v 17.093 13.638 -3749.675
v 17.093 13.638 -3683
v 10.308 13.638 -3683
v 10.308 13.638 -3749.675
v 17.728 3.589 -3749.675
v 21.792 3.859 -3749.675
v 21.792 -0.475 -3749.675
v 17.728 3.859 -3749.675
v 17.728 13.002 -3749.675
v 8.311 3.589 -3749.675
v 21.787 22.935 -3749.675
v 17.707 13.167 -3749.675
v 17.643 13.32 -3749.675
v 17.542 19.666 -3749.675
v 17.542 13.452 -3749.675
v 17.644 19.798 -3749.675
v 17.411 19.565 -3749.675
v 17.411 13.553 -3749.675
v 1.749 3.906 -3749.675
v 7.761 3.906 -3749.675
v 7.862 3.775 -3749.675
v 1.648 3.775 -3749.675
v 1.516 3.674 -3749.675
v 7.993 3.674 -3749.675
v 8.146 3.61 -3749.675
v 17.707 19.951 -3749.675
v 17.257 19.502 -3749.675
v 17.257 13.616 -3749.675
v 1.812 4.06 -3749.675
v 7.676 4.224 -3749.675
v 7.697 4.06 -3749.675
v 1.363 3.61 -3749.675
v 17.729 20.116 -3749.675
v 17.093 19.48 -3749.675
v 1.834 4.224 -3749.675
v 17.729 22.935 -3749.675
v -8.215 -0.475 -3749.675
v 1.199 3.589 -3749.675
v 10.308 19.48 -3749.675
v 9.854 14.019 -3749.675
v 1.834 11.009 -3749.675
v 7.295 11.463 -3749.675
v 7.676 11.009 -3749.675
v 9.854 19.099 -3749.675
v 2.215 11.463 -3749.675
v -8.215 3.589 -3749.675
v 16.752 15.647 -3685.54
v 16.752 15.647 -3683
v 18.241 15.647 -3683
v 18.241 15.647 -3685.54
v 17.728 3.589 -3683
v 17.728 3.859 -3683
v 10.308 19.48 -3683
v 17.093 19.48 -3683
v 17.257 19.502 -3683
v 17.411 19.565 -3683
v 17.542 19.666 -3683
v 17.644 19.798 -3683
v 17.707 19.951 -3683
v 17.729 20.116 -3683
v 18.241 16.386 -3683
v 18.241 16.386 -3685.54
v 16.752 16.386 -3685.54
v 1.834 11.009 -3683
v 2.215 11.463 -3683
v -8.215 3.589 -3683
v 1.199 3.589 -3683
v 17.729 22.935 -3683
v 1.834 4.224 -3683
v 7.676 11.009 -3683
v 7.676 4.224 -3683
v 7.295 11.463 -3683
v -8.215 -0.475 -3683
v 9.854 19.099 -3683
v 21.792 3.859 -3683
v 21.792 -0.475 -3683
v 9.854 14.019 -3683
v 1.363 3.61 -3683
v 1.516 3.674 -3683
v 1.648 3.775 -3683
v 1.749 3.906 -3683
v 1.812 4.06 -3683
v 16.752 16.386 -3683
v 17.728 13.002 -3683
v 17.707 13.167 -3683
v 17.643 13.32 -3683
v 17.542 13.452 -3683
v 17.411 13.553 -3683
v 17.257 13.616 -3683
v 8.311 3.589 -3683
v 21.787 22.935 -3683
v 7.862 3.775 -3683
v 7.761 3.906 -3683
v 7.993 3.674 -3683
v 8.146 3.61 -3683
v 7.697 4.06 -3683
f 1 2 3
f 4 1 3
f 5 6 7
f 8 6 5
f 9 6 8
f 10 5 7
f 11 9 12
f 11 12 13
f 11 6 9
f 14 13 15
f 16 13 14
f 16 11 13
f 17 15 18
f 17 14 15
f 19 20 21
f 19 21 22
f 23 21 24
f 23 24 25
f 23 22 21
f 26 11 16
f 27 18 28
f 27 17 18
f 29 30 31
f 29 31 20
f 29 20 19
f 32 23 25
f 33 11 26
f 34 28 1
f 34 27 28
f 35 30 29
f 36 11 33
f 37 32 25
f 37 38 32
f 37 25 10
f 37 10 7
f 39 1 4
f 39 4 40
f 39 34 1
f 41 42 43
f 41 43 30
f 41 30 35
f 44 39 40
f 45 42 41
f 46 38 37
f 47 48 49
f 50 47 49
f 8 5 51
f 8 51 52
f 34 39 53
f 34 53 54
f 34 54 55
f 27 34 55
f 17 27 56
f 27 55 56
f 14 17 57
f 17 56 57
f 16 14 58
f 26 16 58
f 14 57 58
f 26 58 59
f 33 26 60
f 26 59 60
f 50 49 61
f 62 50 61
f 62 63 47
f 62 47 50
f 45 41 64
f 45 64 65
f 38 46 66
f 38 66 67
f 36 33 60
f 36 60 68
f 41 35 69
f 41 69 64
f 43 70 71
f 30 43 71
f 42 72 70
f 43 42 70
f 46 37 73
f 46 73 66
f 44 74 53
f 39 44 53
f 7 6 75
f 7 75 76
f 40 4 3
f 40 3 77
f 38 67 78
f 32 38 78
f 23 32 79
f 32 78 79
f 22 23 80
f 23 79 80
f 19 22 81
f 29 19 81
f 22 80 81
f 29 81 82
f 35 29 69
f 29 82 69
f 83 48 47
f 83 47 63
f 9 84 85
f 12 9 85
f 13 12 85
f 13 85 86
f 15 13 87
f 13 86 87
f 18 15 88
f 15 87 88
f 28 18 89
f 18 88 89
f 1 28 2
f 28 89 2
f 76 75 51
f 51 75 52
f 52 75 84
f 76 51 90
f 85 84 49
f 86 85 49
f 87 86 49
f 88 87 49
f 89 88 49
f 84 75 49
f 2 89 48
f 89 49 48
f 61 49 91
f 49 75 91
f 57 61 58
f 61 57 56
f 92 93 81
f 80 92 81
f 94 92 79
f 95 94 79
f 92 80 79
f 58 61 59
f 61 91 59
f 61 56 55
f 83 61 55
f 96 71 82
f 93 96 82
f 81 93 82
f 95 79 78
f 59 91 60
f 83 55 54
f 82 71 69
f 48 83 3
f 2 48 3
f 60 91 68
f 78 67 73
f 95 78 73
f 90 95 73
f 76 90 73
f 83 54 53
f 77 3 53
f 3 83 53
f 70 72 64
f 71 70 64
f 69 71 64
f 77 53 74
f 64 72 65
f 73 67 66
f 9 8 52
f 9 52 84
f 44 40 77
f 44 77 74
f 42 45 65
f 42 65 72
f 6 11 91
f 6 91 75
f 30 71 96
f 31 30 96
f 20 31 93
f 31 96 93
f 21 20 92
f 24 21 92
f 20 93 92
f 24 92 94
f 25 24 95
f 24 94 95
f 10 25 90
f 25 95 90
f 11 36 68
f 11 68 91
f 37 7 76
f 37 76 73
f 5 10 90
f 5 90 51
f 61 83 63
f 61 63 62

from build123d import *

# Parameters (mm, degrees)
BOSS_EXTRUDE1_DEPTH = 66.675
CUT_EXTRUDE1_REACH  = 75.8
CUT_EXTRUDE2_REACH  = 75.8
SKETCH5_W           = 1.489310624
SKETCH5_H           = 0.739469686
CUT_EXTRUDE3_DEPTH  = 2.54


with BuildPart() as part:
    # Sketch1 → Boss-Extrude1 (new body)
    with BuildSketch(Plane(origin=(0, 0, -3683), x_dir=(-1, 0, 0), z_dir=(0, 0, -1))):
        with BuildLine():
            Line((7.945265893, 3.588862728), (-1.198734107, 3.588862728))
            ThreePointArc((-1.198734107, 3.588862728), (-1.647746913, 3.774849922), (-1.833734107, 4.223862728))
            Line((-1.833734107, 4.223862728), (-1.833734107, 5.747862728))
            ThreePointArc((-1.833734107, 5.747862728), (-1.647746913, 6.196875535), (-1.198734107, 6.382862728))
            Line((-1.198734107, 6.382862728), (1.621629442, 6.382862728))
            Line((1.621629442, 6.382862728), (1.621629442, 6.890862686))
            Line((1.621629442, 6.890862686), (-2.214734107, 11.462862728))
            Line((-2.214734107, 11.462862728), (-7.294734107, 11.462862728))
            Line((-7.294734107, 11.462862728), (-11.131097656, 6.890862686))
            Line((-11.131097656, 6.890862686), (-11.131097656, 6.382862728))
            Line((-11.131097656, 6.382862728), (-8.310734107, 6.382862728))
            ThreePointArc((-8.310734107, 6.382862728), (-7.861721301, 6.196875535), (-7.675734107, 5.747862728))
            Line((-7.675734107, 5.747862728), (-7.675734107, 4.223862728))
            ThreePointArc((-7.675734107, 4.223862728), (-7.861721301, 3.774849922), (-8.310734107, 3.588862728))
            Line((-8.310734107, 3.588862728), (-17.454734107, 3.588862728))
            Line((-17.454734107, 3.588862728), (-17.727921752, 3.588862728))
            Line((-17.727921752, 3.588862728), (-17.727921752, 3.858842754))
            Line((-17.727921752, 3.858842754), (-17.728361466, 13.002372481))
            ThreePointArc((-17.728361466, 13.002372481), (-17.542256287, 13.451715967), (-17.092921752, 13.637842754))
            Line((-17.092921752, 13.637842754), (-15.568921752, 13.637842754))
            ThreePointArc((-15.568921752, 13.637842754), (-15.119908946, 13.45185556), (-14.933921752, 13.002842754))
            Line((-14.933921752, 13.002842754), (-14.933921752, 10.182479205))
            Line((-14.933921752, 10.182479205), (-14.425921794, 10.182479205))
            Line((-14.425921794, 10.182479205), (-9.853921752, 14.018842754))
            Line((-9.853921752, 14.018842754), (-9.853921752, 19.098842754))
            Line((-9.853921752, 19.098842754), (-14.425921794, 22.935206303))
            Line((-14.425921794, 22.935206303), (-14.933921752, 22.935206303))
            Line((-14.933921752, 22.935206303), (-14.933921752, 20.114842754))
            ThreePointArc((-14.933921752, 20.114842754), (-15.119908946, 19.665829948), (-15.568921752, 19.479842754))
            Line((-15.568921752, 19.479842754), (-17.092921752, 19.479842754))
            ThreePointArc((-17.092921752, 19.479842754), (-17.542476558, 19.66604812), (-17.728703542, 20.11559397))
            Line((-17.728703542, 20.11559397), (-17.728839138, 22.935206303))
            Line((-17.728839138, 22.935206303), (-21.787214199, 22.935206303))
            Line((-21.787214199, 22.935206303), (-21.791921752, 3.859128788))
            Line((-21.791921752, 3.859128788), (-21.791921752, 3.588862728))
            Line((-21.791921752, 3.588862728), (-21.791921752, -0.475137272))
            Line((-21.791921752, -0.475137272), (-17.727921752, -0.475137272))
            Line((-17.727921752, -0.475137272), (-17.454774021, -0.475137272))
            Line((-17.454774021, -0.475137272), (7.945225979, -0.475137272))
            Line((7.945225979, -0.475137272), (8.215492039, -0.475137272))
            Line((8.215492039, -0.475137272), (8.215492039, 3.588862728))
            Line((8.215492039, 3.588862728), (7.945265893, 3.588862728))
        make_face()
    extrude(amount=BOSS_EXTRUDE1_DEPTH)

    # Sketch2 → Cut-Extrude1 (cut, up to next)
    with BuildSketch(Plane.XY.offset(-3683), mode=Mode.PRIVATE) as cut_extrude1_sk1:
        with BuildLine():
            Line((11.131097656, 6.890862686), (11.131097656, 6.382862728))
            Line((11.131097656, 6.382862728), (8.310734107, 6.382862728))
            ThreePointArc((8.310734107, 6.382862728), (7.861721301, 6.196875535), (7.675734107, 5.747862728))
            Line((7.675734107, 5.747862728), (7.675734107, 11.00880461))
            Line((7.675734107, 11.00880461), (11.131097656, 6.890862686))
        make_face()
    cut_extrude1_tool1 = extrude(cut_extrude1_sk1.sketch, amount=-CUT_EXTRUDE1_REACH, mode=Mode.PRIVATE) & part.part
    # Sketch2 → Cut-Extrude1 (cut, up to next)
    with BuildSketch(Plane.XY.offset(-3683), mode=Mode.PRIVATE) as cut_extrude1_sk2:
        with BuildLine():
            Line((1.833734107, 5.747862728), (1.833734107, 11.00880461))
            Line((1.833734107, 11.00880461), (-1.621629442, 6.890862686))
            Line((-1.621629442, 6.890862686), (-1.621629442, 6.382862728))
            Line((-1.621629442, 6.382862728), (1.198734107, 6.382862728))
            ThreePointArc((1.198734107, 6.382862728), (1.647746913, 6.196875535), (1.833734107, 5.747862728))
        make_face()
    cut_extrude1_tool2 = extrude(cut_extrude1_sk2.sketch, amount=-CUT_EXTRUDE1_REACH, mode=Mode.PRIVATE) & part.part
    add(cut_extrude1_tool1.solids().sort_by_distance((8.930632, 7.925168, -3683))[0], mode=Mode.SUBTRACT)
    add(cut_extrude1_tool2.solids().sort_by_distance((0.578837, 7.925168, -3683))[0], mode=Mode.SUBTRACT)

    # Sketch3 → Cut-Extrude2 (cut, up to next)
    with BuildSketch(Plane.XY.offset(-3683), mode=Mode.PRIVATE) as cut_extrude2_sk1:
        with BuildLine():
            Line((15.568921752, 19.479842754), (10.307979871, 19.479842754))
            Line((10.307979871, 19.479842754), (14.425921794, 22.935206303))
            Line((14.425921794, 22.935206303), (14.933921752, 22.935206303))
            Line((14.933921752, 22.935206303), (14.933921752, 20.114842754))
            ThreePointArc((14.933921752, 20.114842754), (15.119908946, 19.665829948), (15.568921752, 19.479842754))
        make_face()
    cut_extrude2_tool1 = extrude(cut_extrude2_sk1.sketch, amount=-CUT_EXTRUDE2_REACH, mode=Mode.PRIVATE) & part.part
    # Sketch3 → Cut-Extrude2 (cut, up to next)
    with BuildSketch(Plane.XY.offset(-3683), mode=Mode.PRIVATE) as cut_extrude2_sk2:
        with BuildLine():
            Line((10.307979871, 13.637842754), (14.425921794, 10.182479205))
            Line((14.425921794, 10.182479205), (14.933921752, 10.182479205))
            Line((14.933921752, 10.182479205), (14.933921752, 13.002842754))
            ThreePointArc((14.933921752, 13.002842754), (15.119908946, 13.45185556), (15.568921752, 13.637842754))
            Line((15.568921752, 13.637842754), (10.307979871, 13.637842754))
        make_face()
    cut_extrude2_tool2 = extrude(cut_extrude2_sk2.sketch, amount=-CUT_EXTRUDE2_REACH, mode=Mode.PRIVATE) & part.part
    add(cut_extrude2_tool1.solids().sort_by_distance((13.391616, 20.73474, -3683))[0], mode=Mode.SUBTRACT)
    add(cut_extrude2_tool2.solids().sort_by_distance((13.391616, 12.382945, -3683))[0], mode=Mode.SUBTRACT)

    # Sketch5 → Cut-Extrude3 (cut)
    with BuildSketch(Plane.XY.offset(-3683)):
        with Locations((17.496622798, 16.016291439)):
            Rectangle(SKETCH5_W, SKETCH5_H)
    extrude(amount=-CUT_EXTRUDE3_DEPTH, mode=Mode.SUBTRACT)


solid = part.part
